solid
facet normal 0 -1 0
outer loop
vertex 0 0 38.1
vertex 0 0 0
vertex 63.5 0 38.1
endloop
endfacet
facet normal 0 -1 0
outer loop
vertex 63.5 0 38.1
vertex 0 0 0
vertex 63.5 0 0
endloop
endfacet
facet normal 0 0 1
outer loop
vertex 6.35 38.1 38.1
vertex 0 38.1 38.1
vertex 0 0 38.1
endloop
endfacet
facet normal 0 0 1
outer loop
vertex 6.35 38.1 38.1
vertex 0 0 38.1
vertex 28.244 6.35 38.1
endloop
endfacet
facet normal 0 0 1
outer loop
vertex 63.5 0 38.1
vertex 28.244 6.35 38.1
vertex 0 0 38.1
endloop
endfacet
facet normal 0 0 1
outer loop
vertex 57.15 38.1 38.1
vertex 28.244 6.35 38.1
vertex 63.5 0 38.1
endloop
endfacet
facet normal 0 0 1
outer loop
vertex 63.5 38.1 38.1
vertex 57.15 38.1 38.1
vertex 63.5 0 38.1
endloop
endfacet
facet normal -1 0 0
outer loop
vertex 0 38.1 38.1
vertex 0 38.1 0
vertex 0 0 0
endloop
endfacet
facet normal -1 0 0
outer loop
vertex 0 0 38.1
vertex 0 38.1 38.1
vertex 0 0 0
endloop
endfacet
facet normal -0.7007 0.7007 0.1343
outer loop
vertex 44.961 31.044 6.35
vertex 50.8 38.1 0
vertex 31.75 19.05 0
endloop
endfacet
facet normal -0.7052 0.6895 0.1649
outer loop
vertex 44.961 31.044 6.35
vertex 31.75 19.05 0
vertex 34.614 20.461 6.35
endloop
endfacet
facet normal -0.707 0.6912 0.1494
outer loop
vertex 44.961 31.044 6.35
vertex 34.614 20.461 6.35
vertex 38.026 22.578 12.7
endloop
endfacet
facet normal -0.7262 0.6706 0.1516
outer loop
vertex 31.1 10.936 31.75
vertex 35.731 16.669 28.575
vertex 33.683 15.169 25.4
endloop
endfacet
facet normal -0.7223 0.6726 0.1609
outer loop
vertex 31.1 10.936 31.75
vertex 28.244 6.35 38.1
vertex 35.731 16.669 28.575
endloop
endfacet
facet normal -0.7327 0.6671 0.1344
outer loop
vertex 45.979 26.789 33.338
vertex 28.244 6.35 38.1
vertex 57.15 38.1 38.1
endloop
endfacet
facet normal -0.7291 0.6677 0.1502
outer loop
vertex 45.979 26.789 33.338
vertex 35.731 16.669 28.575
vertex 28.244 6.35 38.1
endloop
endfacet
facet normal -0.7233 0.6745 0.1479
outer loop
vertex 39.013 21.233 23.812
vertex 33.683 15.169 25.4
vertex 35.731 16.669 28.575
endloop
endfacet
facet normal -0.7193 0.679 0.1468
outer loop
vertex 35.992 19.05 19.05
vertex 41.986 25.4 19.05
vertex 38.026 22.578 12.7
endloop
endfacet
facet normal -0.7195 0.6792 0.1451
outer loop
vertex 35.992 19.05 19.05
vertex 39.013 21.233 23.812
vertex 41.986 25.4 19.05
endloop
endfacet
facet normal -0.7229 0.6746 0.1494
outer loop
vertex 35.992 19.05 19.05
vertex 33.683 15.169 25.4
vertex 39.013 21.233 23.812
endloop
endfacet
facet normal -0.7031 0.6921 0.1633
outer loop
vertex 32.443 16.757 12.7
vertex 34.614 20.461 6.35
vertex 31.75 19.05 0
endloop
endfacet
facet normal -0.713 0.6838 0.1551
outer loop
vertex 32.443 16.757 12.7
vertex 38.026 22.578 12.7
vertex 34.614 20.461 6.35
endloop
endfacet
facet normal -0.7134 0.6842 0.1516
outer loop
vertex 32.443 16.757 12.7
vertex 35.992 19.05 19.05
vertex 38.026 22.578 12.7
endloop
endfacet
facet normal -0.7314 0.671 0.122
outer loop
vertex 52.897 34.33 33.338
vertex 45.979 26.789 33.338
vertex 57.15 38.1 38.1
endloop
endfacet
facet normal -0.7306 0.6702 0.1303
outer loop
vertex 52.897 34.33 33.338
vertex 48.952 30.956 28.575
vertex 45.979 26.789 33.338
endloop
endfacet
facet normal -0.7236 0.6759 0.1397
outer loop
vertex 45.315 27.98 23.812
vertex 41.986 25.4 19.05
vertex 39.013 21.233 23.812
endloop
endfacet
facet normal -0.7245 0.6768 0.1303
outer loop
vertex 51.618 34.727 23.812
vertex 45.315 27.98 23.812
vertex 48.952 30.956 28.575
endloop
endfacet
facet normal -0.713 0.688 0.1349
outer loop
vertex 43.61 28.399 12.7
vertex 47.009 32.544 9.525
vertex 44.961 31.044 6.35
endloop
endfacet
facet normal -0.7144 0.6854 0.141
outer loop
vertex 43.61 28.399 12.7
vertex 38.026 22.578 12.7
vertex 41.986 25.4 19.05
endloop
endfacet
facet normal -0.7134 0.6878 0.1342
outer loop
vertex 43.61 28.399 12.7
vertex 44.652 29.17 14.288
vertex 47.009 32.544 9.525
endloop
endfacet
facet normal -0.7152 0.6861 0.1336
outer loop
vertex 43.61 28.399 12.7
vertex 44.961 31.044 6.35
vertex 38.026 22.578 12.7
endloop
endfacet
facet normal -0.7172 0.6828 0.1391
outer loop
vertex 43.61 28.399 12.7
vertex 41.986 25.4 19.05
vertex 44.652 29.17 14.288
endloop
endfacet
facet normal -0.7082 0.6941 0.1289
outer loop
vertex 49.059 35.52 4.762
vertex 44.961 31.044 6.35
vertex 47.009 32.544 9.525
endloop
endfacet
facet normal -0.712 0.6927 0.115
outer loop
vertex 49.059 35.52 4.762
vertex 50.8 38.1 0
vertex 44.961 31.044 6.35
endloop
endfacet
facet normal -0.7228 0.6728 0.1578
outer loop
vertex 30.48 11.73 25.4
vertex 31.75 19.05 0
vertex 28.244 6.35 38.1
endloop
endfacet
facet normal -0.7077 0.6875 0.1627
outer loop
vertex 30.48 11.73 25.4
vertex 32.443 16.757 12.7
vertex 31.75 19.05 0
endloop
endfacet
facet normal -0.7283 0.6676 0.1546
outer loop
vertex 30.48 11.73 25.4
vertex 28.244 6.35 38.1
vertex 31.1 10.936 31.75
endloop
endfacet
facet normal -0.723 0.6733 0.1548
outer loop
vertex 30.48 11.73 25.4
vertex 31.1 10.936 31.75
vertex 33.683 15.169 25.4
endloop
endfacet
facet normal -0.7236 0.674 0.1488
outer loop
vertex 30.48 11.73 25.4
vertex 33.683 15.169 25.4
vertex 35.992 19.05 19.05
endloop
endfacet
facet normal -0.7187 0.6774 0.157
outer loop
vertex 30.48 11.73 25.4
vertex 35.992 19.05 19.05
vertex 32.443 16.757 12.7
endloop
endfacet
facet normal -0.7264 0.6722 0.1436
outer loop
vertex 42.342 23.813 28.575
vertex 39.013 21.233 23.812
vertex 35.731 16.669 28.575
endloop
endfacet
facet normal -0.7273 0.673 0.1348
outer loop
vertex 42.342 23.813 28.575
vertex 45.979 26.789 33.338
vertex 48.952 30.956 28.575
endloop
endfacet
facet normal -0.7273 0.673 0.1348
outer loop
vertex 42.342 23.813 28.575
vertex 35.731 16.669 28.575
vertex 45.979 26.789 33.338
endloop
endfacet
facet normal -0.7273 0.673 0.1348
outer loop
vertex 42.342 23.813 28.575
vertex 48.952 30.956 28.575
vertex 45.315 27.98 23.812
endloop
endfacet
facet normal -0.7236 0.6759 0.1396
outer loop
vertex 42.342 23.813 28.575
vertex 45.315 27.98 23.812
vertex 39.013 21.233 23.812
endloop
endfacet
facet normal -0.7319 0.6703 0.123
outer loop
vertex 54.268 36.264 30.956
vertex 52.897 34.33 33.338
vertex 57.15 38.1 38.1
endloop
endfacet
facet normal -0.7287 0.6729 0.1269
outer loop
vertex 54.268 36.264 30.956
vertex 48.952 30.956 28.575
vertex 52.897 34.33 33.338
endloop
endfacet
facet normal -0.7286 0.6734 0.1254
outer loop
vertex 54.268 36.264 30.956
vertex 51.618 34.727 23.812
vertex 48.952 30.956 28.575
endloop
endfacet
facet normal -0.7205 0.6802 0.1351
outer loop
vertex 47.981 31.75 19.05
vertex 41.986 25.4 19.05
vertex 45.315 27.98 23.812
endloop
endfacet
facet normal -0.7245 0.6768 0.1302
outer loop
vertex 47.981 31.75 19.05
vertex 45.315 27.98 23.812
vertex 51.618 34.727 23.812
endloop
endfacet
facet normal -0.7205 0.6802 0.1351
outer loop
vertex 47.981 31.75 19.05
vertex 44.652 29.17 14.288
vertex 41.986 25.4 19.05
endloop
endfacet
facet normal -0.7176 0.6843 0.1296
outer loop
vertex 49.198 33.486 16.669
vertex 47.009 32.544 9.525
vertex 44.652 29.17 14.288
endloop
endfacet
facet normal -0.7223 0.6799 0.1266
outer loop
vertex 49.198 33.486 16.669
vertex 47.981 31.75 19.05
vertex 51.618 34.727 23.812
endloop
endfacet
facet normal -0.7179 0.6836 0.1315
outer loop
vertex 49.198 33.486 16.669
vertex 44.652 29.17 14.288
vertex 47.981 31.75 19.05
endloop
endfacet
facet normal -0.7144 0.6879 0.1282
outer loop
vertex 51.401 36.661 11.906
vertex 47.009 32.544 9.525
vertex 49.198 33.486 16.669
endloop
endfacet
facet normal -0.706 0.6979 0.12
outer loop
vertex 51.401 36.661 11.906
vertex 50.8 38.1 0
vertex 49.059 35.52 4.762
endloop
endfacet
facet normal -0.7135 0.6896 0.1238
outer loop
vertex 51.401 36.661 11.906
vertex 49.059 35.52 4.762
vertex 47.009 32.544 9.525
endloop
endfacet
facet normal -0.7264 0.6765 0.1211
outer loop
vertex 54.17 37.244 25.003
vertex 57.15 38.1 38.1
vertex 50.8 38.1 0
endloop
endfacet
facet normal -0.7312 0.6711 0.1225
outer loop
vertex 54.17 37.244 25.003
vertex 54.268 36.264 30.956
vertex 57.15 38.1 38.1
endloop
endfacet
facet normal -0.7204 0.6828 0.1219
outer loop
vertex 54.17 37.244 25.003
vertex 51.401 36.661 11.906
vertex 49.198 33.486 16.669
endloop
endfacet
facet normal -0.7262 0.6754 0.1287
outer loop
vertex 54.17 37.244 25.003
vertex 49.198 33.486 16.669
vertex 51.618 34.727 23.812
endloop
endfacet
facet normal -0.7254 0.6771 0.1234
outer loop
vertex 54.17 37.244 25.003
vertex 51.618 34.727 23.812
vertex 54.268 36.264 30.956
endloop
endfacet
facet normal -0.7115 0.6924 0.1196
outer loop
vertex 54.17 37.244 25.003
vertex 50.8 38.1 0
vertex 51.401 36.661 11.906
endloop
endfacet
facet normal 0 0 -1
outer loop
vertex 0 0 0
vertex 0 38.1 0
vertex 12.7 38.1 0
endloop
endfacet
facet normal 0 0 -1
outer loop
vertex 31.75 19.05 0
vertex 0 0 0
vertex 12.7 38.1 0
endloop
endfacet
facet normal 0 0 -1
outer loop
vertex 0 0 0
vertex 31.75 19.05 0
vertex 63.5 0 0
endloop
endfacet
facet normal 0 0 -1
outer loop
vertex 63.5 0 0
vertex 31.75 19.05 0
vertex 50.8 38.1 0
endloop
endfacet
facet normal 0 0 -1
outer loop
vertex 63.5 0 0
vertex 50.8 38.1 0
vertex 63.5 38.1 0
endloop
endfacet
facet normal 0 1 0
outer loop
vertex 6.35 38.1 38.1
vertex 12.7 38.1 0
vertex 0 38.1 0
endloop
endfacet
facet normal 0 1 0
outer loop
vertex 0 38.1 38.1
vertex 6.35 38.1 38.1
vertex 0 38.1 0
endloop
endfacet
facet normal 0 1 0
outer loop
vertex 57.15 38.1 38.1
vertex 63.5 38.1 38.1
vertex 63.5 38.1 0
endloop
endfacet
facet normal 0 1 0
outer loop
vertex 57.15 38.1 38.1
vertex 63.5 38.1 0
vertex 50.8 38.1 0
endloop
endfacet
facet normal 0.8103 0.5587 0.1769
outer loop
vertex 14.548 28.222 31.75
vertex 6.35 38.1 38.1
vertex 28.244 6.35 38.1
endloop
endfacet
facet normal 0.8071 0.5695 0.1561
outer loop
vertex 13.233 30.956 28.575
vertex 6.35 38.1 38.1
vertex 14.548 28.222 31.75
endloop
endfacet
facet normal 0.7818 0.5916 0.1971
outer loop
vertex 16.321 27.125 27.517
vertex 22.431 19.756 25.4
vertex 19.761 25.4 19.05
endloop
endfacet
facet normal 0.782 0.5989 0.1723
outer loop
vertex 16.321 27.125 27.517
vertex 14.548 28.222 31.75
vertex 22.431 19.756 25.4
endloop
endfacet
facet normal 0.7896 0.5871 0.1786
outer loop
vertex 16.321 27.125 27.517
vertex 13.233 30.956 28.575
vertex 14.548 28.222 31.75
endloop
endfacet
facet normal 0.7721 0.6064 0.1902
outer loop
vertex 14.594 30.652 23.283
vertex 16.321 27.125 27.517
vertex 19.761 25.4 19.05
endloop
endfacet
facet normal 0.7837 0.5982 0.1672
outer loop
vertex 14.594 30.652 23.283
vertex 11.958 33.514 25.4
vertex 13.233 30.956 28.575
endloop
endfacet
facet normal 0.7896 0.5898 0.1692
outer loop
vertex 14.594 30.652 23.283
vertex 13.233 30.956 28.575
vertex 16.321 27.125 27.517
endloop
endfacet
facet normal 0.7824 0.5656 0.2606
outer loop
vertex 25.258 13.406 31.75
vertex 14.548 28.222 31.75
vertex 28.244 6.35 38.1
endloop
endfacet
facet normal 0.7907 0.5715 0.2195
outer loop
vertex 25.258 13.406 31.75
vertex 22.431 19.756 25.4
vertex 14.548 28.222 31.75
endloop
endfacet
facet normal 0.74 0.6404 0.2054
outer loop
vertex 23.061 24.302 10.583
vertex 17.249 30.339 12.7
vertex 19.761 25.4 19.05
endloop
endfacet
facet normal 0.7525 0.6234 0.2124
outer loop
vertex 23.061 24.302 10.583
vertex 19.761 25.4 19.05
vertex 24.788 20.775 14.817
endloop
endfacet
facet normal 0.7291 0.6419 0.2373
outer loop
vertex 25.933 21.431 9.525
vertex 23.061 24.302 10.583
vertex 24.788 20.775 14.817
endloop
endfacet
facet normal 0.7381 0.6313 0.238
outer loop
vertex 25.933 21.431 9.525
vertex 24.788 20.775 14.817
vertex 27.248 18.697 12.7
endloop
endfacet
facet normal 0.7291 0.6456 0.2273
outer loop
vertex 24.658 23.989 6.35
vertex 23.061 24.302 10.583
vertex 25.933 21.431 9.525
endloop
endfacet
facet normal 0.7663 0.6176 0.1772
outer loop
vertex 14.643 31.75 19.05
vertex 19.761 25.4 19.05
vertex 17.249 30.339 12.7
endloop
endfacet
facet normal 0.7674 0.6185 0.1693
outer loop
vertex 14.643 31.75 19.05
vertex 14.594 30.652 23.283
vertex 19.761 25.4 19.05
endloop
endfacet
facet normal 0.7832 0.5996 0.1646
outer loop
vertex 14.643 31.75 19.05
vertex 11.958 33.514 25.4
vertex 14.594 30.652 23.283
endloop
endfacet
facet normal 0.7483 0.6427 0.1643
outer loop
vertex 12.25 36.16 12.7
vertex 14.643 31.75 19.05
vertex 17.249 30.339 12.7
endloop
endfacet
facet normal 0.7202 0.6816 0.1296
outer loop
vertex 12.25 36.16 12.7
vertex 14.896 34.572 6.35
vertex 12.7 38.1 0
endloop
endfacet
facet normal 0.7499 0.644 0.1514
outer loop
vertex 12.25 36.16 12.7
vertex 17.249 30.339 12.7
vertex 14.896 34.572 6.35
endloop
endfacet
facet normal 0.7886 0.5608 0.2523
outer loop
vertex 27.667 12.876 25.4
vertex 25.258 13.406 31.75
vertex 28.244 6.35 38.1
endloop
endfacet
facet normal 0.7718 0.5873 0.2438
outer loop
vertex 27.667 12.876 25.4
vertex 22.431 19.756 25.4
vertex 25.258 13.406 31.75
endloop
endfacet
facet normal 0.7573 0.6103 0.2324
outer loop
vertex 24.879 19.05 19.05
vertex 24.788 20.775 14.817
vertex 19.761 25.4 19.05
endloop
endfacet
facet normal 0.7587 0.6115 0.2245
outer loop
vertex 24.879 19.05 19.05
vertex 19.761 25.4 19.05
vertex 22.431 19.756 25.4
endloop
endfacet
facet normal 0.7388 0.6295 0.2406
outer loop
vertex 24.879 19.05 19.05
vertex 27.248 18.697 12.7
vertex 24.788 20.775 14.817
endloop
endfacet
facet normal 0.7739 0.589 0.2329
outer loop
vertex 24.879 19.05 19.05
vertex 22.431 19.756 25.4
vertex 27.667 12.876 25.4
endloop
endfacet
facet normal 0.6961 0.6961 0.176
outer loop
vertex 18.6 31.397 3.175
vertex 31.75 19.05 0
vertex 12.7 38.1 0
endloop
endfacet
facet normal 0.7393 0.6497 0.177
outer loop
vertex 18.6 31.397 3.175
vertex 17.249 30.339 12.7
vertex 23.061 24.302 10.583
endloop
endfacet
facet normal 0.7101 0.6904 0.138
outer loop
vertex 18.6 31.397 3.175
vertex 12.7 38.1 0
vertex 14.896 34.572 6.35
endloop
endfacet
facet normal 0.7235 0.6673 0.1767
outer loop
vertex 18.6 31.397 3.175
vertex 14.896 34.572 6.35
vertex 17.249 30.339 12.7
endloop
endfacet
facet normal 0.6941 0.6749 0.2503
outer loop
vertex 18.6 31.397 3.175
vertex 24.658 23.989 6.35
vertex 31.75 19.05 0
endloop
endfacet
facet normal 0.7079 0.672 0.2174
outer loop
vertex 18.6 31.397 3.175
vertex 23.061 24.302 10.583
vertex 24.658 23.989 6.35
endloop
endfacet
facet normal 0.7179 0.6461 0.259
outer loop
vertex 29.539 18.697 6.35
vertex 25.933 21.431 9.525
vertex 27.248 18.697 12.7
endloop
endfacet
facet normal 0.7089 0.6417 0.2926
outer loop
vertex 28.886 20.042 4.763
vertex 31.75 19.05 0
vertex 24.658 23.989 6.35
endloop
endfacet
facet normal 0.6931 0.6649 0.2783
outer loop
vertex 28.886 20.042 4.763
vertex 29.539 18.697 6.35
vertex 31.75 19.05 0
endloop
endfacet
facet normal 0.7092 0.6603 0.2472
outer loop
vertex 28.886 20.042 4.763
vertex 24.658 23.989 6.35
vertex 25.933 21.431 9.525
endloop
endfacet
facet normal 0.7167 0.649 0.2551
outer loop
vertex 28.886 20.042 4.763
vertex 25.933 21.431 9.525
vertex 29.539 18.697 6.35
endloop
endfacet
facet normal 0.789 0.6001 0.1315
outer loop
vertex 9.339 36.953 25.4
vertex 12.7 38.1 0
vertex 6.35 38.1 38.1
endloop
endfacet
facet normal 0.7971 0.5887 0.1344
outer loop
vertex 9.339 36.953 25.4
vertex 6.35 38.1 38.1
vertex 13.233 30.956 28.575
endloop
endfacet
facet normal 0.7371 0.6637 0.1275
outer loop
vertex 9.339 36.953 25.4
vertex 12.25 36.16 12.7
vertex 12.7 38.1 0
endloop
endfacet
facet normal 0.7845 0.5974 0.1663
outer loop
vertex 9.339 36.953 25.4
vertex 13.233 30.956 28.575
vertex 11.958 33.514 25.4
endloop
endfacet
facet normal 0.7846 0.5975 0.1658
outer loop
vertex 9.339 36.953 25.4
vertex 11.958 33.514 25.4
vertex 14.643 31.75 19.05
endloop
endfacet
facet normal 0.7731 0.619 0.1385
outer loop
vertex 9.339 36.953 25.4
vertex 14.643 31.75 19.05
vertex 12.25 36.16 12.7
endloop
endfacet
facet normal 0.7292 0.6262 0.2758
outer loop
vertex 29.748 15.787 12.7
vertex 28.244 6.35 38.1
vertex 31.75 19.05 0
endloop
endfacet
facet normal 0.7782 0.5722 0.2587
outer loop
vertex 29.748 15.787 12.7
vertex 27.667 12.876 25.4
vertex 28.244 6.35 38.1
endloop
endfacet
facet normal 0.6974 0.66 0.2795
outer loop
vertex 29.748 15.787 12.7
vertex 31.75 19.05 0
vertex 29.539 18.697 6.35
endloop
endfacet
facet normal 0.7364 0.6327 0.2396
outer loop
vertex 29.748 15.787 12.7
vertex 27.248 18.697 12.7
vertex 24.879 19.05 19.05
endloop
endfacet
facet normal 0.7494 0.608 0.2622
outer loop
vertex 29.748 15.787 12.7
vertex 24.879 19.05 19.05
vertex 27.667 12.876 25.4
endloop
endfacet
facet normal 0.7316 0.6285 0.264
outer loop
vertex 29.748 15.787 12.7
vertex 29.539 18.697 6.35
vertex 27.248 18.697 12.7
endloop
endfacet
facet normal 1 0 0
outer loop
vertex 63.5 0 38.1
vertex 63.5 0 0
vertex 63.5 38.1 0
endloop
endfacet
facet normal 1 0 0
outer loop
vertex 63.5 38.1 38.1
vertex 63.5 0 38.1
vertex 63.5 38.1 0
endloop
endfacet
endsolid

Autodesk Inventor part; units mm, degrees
ref_plane "YZ Plane" through (0, 0, 0) normal (1, 0, 0) x (0, 1, 0)
ref_plane "XZ Plane" through (0, 0, 0) normal (0, 1, 0) x (-1, 0, 0)
ref_plane "XY Plane" through (0, 0, 0) normal (0, 0, 1) x (1, 0, 0)
sketch "Sketch1" plane through (0, 0, 0) normal (0, 0, 1) x (1, 0, 0)
  line L0 (0, 0) -> (63.5, 0)
  line L1 (63.5, 0) -> (63.5, 38.1)
  line L2 (63.5, 38.1) -> (0, 38.1)
  line L3 (0, 38.1) -> (0, 0)
  dimension "d0" = 63.5
  dimension "d1" = 38.1
extrude "Extrusion1" add sketch "Sketch1" along normal blind 38.1
sketch "Sketch2" plane through (0, 0, 38.1) normal (0, 0, 1) x (1, 0, 0)
  line L0 (63.5, 38.1) -> (0, 38.1) projected
  line L1 (6.35, 38.1) -> (28.2442, 6.35)
  line L2 (28.2442, 6.35) -> (57.15, 38.1)
  line L3 (0, 0) -> (63.5, 0) projected
  line L4 (6.35, 38.1) -> (57.15, 38.1)
  dimension "d4" = 6.35
  dimension "d5" = 6.35
  dimension "d6" = 6.35
sketch "Sketch3" plane through (0, 0, 0) normal (0, 0, -1) x (-1, 0, 0)
  line L0 (-63.5, 38.1) -> (0, 38.1) projected
  line L1 (-50.8, 38.1) -> (-31.75, 19.05)
  line L2 (-31.75, 19.05) -> (-12.7, 38.1)
  line L3 (0, 0) -> (-63.5, 0) projected
  line L4 (0, 38.1) -> (0, 0) projected
  line L5 (-50.8, 38.1) -> (-12.7, 38.1)
  dimension "d7" = 12.7
  dimension "d8" = 19.05
  dimension "d9" = 12.7
  dimension "d10" = 31.75
loft "Loft1" cut profiles "Sketch2", "Sketch3"
properties part number "loft cut cordier"
